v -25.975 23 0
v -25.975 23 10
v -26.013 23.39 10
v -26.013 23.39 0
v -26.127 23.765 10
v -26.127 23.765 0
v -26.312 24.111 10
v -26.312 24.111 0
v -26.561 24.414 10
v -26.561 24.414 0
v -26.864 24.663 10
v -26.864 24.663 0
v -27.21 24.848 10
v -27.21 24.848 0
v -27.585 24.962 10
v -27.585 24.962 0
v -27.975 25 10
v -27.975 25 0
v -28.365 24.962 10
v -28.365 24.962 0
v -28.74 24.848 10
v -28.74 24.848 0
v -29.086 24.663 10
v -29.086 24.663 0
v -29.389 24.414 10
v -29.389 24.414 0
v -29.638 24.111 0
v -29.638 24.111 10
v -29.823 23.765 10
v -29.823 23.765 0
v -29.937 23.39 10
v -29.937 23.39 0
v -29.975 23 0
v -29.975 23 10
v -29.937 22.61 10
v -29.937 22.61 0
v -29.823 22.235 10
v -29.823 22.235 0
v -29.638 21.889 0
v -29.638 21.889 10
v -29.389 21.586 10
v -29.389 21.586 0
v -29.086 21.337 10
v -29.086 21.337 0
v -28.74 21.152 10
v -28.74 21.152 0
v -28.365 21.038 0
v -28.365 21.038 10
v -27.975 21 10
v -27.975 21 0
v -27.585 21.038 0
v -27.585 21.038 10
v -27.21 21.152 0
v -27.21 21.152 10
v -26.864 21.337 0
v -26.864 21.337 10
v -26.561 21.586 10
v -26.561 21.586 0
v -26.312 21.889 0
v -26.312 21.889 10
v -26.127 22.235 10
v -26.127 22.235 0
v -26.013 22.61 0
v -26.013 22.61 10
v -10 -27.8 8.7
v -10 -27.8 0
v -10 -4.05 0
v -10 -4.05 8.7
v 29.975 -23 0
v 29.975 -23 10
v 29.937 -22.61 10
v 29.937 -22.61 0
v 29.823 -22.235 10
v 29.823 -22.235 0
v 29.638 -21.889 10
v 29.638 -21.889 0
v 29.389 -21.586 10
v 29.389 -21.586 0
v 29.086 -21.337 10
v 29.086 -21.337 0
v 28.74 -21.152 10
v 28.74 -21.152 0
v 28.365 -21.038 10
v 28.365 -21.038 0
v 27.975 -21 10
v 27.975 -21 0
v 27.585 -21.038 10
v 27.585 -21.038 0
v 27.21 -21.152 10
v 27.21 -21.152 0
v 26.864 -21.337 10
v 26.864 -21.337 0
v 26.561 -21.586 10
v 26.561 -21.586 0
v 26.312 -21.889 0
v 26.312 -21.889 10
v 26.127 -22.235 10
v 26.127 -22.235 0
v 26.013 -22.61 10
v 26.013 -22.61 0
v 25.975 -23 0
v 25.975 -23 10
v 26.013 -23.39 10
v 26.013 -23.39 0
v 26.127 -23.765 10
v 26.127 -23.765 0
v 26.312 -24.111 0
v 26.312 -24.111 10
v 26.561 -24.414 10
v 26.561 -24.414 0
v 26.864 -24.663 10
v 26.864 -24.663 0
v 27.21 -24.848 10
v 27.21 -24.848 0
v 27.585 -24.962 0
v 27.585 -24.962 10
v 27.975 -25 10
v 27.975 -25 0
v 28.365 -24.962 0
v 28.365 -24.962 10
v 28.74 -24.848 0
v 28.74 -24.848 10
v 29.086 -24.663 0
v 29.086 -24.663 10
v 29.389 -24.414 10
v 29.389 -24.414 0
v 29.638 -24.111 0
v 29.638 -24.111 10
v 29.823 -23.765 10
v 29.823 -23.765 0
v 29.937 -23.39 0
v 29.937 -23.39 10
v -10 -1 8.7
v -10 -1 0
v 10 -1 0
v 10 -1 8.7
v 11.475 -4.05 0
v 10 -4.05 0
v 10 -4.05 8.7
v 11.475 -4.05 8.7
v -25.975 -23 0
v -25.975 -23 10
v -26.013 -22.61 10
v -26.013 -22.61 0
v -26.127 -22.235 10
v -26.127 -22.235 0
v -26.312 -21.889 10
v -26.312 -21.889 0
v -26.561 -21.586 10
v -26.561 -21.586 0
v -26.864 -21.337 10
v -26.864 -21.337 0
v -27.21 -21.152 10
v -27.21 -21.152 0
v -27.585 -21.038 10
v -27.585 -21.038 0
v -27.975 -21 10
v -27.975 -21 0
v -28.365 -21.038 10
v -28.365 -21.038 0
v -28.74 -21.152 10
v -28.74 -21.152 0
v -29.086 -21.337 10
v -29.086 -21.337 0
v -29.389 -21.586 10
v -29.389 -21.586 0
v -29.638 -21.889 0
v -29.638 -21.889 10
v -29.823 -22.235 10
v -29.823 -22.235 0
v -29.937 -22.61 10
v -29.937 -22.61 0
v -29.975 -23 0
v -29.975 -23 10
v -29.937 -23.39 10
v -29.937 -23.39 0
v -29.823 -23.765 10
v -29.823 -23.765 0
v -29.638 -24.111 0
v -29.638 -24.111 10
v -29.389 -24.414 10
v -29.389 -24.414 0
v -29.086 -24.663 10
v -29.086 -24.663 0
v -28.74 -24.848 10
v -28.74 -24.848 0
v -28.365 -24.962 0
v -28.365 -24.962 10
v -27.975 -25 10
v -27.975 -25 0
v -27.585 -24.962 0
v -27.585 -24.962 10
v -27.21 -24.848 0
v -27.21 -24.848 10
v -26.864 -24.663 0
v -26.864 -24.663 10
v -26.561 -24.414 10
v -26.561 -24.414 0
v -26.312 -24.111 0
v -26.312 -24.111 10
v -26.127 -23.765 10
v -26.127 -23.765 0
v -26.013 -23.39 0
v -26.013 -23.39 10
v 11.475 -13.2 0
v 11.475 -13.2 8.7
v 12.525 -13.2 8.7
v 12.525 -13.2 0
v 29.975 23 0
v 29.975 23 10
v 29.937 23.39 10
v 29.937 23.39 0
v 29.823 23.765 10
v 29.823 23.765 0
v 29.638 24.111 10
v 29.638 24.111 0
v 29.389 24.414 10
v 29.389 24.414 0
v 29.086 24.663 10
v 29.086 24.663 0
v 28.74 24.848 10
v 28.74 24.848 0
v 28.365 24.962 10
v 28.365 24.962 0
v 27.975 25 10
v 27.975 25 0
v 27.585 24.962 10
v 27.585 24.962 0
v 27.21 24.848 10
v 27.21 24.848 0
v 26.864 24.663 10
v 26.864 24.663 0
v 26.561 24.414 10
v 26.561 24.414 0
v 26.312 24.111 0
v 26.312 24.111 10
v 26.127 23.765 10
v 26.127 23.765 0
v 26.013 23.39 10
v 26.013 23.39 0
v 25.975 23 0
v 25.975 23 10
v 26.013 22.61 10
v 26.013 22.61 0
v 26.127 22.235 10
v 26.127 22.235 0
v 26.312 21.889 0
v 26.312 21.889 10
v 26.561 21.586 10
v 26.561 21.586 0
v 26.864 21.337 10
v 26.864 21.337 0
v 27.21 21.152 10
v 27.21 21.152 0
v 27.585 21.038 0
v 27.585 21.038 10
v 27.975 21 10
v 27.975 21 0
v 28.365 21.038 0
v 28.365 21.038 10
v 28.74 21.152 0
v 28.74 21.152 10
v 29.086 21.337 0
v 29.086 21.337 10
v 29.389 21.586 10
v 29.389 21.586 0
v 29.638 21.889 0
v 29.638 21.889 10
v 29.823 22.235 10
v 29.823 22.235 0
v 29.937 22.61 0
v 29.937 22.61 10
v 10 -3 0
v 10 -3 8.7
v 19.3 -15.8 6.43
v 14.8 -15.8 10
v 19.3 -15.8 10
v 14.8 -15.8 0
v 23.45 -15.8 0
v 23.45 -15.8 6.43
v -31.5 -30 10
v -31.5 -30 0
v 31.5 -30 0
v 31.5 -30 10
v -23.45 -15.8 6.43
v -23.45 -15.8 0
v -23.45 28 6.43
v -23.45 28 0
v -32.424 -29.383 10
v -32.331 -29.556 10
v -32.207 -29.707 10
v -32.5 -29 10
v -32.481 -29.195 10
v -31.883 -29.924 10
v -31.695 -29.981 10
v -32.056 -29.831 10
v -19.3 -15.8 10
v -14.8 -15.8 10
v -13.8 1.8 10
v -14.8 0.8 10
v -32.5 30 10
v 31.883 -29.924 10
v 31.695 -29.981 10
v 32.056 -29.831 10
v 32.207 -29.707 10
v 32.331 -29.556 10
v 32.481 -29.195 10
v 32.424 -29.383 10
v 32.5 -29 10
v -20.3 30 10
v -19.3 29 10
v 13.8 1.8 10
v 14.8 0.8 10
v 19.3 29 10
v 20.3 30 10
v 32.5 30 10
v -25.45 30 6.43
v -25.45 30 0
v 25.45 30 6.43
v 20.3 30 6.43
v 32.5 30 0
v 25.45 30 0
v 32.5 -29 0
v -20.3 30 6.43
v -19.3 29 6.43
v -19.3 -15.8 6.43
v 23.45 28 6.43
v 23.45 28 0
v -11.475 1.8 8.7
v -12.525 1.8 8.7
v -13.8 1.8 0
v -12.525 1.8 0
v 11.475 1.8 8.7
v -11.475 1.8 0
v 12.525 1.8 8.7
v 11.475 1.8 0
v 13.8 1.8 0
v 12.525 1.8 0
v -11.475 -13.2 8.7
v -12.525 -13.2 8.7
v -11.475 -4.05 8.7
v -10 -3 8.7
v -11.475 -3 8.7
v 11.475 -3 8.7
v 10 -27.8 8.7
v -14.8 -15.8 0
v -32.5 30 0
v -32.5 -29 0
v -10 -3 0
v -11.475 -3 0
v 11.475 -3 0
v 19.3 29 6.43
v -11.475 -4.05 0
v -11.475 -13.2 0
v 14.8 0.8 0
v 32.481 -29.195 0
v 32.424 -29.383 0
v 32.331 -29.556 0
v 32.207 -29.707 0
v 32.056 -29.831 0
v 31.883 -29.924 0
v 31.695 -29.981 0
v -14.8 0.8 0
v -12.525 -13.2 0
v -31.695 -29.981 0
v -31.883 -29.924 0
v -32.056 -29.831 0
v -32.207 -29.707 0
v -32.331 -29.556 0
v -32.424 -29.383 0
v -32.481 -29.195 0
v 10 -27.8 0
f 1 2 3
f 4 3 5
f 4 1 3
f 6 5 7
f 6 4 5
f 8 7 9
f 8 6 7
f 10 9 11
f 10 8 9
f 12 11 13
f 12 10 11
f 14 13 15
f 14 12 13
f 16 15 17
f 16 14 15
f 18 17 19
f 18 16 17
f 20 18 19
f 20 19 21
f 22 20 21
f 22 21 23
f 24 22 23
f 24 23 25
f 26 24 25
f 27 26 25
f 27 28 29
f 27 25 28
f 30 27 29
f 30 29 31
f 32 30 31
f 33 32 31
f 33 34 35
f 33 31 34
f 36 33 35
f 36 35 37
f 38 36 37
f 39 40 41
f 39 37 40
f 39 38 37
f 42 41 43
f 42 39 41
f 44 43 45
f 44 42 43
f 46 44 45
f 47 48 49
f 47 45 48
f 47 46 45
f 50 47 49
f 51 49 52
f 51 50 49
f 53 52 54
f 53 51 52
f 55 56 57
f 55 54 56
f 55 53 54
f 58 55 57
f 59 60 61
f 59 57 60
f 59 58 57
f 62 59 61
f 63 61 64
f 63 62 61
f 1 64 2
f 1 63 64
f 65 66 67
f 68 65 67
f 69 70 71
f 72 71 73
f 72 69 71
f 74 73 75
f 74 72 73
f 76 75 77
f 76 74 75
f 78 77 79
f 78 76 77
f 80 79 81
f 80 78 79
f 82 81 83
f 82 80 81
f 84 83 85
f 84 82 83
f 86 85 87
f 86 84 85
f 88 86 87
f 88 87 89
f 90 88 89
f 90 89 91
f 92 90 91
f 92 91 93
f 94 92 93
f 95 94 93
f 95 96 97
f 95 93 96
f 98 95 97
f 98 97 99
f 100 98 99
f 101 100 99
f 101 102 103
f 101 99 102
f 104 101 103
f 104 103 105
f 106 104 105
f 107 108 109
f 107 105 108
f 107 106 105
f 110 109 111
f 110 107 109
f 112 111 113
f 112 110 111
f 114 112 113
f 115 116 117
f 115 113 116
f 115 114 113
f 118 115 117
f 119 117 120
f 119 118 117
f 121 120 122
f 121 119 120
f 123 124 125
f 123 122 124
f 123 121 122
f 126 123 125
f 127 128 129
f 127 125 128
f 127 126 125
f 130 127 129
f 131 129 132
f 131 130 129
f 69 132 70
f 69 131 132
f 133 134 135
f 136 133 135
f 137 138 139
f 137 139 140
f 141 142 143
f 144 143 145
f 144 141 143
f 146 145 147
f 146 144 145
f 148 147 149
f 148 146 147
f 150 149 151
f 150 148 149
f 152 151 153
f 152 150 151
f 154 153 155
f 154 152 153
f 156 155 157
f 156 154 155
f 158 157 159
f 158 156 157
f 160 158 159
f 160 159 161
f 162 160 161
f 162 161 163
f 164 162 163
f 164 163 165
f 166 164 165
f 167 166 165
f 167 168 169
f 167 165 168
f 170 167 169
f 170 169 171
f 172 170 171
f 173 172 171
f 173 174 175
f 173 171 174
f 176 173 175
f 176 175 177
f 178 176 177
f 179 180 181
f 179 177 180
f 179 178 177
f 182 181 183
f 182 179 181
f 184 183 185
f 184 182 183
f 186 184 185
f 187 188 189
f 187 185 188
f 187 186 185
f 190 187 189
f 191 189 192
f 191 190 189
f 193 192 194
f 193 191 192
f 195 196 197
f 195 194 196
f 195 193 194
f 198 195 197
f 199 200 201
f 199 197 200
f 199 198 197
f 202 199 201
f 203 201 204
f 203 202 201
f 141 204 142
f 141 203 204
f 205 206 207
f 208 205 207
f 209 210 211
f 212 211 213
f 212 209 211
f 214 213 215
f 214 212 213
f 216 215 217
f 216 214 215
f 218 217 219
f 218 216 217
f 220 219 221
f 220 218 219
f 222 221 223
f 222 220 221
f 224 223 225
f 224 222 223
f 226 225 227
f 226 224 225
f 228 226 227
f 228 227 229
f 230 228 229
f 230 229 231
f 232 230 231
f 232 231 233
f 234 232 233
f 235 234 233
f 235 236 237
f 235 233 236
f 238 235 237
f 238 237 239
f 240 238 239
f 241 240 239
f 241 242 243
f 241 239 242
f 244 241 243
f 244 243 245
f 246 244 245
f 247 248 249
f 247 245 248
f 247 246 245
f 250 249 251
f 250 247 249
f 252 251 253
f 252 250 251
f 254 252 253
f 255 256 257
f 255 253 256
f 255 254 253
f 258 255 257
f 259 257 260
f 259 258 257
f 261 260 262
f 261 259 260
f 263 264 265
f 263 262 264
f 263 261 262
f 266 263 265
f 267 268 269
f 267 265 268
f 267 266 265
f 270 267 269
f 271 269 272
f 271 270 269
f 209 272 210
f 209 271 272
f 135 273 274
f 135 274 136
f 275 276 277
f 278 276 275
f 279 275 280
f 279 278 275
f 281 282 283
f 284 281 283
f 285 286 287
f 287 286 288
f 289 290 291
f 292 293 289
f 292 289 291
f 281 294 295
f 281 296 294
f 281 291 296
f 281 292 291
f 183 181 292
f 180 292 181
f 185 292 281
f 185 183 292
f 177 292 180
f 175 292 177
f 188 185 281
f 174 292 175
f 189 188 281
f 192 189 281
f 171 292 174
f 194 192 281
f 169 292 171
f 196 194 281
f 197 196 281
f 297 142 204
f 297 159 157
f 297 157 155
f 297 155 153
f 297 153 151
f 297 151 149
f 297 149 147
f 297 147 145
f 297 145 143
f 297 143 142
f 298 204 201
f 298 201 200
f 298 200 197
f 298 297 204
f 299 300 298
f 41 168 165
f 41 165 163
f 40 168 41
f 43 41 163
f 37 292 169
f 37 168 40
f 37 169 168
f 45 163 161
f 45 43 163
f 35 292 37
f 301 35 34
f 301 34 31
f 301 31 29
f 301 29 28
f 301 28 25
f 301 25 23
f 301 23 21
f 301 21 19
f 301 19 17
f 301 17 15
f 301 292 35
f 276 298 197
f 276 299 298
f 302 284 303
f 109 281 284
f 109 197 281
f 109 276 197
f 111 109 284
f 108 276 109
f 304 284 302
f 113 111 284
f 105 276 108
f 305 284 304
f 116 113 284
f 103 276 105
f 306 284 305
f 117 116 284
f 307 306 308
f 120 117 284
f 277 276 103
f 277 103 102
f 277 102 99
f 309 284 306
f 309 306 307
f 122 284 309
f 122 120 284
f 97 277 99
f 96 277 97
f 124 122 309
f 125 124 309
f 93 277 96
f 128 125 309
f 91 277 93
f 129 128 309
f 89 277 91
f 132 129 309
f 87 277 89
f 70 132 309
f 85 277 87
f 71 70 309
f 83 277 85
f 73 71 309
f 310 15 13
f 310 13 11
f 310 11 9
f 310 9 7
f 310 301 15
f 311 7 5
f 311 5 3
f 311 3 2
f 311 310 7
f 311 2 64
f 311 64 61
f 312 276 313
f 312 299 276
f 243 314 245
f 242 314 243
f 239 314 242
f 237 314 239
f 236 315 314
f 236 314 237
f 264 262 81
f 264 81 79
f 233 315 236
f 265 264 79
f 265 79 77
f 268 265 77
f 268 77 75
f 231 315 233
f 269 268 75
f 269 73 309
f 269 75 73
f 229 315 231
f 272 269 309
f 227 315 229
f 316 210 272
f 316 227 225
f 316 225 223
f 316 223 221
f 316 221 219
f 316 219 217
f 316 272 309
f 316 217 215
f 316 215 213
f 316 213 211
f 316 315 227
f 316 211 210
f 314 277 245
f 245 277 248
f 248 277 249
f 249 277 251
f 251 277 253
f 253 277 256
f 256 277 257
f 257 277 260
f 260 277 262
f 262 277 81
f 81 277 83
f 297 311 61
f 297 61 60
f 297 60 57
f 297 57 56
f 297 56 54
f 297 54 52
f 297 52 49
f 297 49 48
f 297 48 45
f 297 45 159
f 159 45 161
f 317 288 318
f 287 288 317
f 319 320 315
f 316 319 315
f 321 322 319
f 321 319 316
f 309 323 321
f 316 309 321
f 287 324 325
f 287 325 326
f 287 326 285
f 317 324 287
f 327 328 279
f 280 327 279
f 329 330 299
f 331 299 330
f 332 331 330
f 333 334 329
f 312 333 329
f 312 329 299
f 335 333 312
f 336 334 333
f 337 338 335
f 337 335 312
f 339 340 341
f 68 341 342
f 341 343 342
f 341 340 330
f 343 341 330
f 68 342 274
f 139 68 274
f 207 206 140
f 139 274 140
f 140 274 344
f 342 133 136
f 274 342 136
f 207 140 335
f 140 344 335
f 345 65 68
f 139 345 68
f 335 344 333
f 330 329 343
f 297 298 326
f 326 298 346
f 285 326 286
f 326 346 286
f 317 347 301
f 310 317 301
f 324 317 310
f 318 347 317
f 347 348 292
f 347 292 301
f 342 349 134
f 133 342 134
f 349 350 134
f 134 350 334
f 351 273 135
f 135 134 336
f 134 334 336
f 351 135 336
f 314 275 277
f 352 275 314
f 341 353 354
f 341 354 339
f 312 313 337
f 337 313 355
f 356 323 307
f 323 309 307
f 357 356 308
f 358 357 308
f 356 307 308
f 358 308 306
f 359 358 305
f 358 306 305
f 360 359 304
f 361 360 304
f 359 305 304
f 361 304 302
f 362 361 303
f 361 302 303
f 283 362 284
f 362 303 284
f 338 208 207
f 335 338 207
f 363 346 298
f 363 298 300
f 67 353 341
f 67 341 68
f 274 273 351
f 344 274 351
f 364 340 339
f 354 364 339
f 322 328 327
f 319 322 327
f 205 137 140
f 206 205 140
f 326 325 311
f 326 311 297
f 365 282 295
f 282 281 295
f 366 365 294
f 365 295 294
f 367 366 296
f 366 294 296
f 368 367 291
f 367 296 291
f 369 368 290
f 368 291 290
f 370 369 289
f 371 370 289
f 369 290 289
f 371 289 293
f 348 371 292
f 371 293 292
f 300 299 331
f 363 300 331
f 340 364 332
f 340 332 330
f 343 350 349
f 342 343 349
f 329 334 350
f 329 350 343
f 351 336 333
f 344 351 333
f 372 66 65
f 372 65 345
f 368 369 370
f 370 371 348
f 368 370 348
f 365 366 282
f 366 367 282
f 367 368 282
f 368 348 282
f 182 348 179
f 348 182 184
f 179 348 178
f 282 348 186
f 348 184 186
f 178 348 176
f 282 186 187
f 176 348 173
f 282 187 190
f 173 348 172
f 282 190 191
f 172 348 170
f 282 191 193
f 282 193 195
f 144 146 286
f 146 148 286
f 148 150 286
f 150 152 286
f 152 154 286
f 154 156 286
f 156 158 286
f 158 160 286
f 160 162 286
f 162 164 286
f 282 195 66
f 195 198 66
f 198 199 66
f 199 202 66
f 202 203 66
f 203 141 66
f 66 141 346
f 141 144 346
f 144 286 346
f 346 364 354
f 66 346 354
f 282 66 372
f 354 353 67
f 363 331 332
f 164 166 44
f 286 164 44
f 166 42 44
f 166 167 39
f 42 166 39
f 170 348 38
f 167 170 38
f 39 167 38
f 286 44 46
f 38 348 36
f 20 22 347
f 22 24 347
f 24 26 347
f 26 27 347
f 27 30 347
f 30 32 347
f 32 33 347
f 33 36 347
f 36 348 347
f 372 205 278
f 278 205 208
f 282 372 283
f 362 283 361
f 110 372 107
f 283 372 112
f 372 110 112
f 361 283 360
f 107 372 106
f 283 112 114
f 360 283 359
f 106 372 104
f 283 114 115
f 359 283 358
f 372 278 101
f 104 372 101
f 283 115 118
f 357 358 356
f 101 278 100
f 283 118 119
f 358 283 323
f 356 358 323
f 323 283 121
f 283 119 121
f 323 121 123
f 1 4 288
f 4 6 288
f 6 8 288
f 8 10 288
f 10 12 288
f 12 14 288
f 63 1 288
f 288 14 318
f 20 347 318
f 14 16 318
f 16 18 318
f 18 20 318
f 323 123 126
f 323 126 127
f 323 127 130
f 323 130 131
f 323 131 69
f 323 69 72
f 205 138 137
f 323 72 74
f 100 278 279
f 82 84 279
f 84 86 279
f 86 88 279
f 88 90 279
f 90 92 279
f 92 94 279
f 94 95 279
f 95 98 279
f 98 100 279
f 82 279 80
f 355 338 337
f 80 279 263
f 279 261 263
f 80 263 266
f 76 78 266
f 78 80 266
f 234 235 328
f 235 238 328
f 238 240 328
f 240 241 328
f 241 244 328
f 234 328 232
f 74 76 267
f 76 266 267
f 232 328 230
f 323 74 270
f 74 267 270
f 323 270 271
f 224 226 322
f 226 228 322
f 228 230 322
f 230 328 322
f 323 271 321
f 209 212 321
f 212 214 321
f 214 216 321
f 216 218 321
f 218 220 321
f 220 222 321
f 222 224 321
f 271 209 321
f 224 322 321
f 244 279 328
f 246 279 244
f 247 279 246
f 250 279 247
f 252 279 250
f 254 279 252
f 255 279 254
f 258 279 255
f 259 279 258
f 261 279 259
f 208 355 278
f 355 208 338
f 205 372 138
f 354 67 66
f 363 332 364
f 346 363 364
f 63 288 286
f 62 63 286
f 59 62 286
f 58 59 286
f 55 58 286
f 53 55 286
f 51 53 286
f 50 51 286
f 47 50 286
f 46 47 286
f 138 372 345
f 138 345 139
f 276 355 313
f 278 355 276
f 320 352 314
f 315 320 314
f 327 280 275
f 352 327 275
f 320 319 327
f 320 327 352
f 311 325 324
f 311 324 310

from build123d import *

# Parameters (mm, degrees)
SKETCH006_W     = 65
SKETCH006_H     = 60
PAD003_DEPTH    = 10
POCKET004_DEPTH = 10.001
POCKET005_DEPTH = 6.43
SKETCH009_W     = 1.05
SKETCH009_H     = 8.7
POCKET006_DEPTH = 15
SKETCH010_W     = 20
SKETCH010_H     = 26.8
POCKET007_DEPTH = 8.7
SKETCH011_W     = 2
SKETCH011_H     = 1.05
POCKET008_DEPTH = 8.7
SKETCH012_R     = 2
POCKET009_DEPTH = 10.001
CHAMFER_SIZE    = 1
CHAMFER001_SIZE = 1
CHAMFER002_SIZE = 2
FILLET002_R     = 1


with BuildPart() as part:
    # Sketch006 → Pad003 (new body)
    with BuildSketch(Plane.XY):
        Rectangle(SKETCH006_W, SKETCH006_H)
    extrude(amount=PAD003_DEPTH)

    # Sketch007 → Pocket004 (cut, through all)
    with BuildSketch(Plane.XY):
        Polygon((-19.3, 30), (-19.3, -15.8), (-14.8, -15.8), (-14.8, 1.8), (14.8, 1.8), (14.8, -15.8), (19.3, -15.8), (19.3, 30), align=None)
    extrude(amount=POCKET004_DEPTH, mode=Mode.SUBTRACT)

    # Sketch008 → Pocket005 (cut)
    with BuildSketch(Plane.XY):
        Polygon((-23.45, 30), (23.45, 30), (23.45, -15.8), (14.8, -15.8), (14.8, 1.8), (-14.8, 1.8), (-14.8, -15.8), (-23.45, -15.8), align=None)
    extrude(amount=POCKET005_DEPTH, mode=Mode.SUBTRACT)

    # Sketch009 (on DatumPlane) → Pocket006 (cut)
    with BuildSketch(Plane.XZ.offset(-1.8)):
        with Locations((-12, 4.35)):
            Rectangle(SKETCH009_W, SKETCH009_H)
        with Locations((12, 4.35)):
            Rectangle(SKETCH009_W, SKETCH009_H)
    extrude(amount=POCKET006_DEPTH, mode=Mode.SUBTRACT)

    # Sketch010 → Pocket007 (cut)
    with BuildSketch(Plane.XY):
        with Locations((0, -14.4)):
            Rectangle(SKETCH010_W, SKETCH010_H)
    extrude(amount=POCKET007_DEPTH, mode=Mode.SUBTRACT)

    # Sketch011 → Pocket008 (cut)
    with BuildSketch(Plane.XY):
        with Locations((-11, -3.525)):
            Rectangle(SKETCH011_W, SKETCH011_H)
        with Locations((11, -3.525)):
            Rectangle(SKETCH011_W, SKETCH011_H)
    extrude(amount=POCKET008_DEPTH, mode=Mode.SUBTRACT)

    # Sketch012 → Pocket009 (cut, through all)
    with BuildSketch(Plane.XY):
        with Locations((-27.975, 23)):
            Circle(SKETCH012_R)
        with Locations((27.975, 23)):
            Circle(SKETCH012_R)
        with Locations((27.975, -23)):
            Circle(SKETCH012_R)
        with Locations((-27.975, -23)):
            Circle(SKETCH012_R)
    extrude(amount=POCKET009_DEPTH, mode=Mode.SUBTRACT)

    # Chamfer
    chamfer_edges = [part.edges().sort_by_distance(p)[0] for p in [
        (19.3, 30, 8.215),
        (-19.3, 30, 8.215),
    ]]
    chamfer(chamfer_edges, length=CHAMFER_SIZE)

    # Chamfer001
    chamfer001_edges = [part.edges().sort_by_distance(p)[0] for p in [
        (14.8, 1.8, 8.215),
        (14.8, 1.8, 3.215),
        (-14.8, 1.8, 3.215),
        (-14.8, 1.8, 8.215),
    ]]
    chamfer(chamfer001_edges, length=CHAMFER001_SIZE)

    # Chamfer002
    chamfer002_edges = [part.edges().sort_by_distance(p)[0] for p in [
        (23.45, 30, 3.215),
        (-23.45, 30, 3.215),
    ]]
    chamfer(chamfer002_edges, length=CHAMFER002_SIZE)

    # Fillet002
    fillet002_edges = [part.edges().sort_by_distance(p)[0] for p in [
        (32.5, -30, 5),
        (-32.5, -30, 5),
    ]]
    fillet(fillet002_edges, radius=FILLET002_R)


solid = part.part
